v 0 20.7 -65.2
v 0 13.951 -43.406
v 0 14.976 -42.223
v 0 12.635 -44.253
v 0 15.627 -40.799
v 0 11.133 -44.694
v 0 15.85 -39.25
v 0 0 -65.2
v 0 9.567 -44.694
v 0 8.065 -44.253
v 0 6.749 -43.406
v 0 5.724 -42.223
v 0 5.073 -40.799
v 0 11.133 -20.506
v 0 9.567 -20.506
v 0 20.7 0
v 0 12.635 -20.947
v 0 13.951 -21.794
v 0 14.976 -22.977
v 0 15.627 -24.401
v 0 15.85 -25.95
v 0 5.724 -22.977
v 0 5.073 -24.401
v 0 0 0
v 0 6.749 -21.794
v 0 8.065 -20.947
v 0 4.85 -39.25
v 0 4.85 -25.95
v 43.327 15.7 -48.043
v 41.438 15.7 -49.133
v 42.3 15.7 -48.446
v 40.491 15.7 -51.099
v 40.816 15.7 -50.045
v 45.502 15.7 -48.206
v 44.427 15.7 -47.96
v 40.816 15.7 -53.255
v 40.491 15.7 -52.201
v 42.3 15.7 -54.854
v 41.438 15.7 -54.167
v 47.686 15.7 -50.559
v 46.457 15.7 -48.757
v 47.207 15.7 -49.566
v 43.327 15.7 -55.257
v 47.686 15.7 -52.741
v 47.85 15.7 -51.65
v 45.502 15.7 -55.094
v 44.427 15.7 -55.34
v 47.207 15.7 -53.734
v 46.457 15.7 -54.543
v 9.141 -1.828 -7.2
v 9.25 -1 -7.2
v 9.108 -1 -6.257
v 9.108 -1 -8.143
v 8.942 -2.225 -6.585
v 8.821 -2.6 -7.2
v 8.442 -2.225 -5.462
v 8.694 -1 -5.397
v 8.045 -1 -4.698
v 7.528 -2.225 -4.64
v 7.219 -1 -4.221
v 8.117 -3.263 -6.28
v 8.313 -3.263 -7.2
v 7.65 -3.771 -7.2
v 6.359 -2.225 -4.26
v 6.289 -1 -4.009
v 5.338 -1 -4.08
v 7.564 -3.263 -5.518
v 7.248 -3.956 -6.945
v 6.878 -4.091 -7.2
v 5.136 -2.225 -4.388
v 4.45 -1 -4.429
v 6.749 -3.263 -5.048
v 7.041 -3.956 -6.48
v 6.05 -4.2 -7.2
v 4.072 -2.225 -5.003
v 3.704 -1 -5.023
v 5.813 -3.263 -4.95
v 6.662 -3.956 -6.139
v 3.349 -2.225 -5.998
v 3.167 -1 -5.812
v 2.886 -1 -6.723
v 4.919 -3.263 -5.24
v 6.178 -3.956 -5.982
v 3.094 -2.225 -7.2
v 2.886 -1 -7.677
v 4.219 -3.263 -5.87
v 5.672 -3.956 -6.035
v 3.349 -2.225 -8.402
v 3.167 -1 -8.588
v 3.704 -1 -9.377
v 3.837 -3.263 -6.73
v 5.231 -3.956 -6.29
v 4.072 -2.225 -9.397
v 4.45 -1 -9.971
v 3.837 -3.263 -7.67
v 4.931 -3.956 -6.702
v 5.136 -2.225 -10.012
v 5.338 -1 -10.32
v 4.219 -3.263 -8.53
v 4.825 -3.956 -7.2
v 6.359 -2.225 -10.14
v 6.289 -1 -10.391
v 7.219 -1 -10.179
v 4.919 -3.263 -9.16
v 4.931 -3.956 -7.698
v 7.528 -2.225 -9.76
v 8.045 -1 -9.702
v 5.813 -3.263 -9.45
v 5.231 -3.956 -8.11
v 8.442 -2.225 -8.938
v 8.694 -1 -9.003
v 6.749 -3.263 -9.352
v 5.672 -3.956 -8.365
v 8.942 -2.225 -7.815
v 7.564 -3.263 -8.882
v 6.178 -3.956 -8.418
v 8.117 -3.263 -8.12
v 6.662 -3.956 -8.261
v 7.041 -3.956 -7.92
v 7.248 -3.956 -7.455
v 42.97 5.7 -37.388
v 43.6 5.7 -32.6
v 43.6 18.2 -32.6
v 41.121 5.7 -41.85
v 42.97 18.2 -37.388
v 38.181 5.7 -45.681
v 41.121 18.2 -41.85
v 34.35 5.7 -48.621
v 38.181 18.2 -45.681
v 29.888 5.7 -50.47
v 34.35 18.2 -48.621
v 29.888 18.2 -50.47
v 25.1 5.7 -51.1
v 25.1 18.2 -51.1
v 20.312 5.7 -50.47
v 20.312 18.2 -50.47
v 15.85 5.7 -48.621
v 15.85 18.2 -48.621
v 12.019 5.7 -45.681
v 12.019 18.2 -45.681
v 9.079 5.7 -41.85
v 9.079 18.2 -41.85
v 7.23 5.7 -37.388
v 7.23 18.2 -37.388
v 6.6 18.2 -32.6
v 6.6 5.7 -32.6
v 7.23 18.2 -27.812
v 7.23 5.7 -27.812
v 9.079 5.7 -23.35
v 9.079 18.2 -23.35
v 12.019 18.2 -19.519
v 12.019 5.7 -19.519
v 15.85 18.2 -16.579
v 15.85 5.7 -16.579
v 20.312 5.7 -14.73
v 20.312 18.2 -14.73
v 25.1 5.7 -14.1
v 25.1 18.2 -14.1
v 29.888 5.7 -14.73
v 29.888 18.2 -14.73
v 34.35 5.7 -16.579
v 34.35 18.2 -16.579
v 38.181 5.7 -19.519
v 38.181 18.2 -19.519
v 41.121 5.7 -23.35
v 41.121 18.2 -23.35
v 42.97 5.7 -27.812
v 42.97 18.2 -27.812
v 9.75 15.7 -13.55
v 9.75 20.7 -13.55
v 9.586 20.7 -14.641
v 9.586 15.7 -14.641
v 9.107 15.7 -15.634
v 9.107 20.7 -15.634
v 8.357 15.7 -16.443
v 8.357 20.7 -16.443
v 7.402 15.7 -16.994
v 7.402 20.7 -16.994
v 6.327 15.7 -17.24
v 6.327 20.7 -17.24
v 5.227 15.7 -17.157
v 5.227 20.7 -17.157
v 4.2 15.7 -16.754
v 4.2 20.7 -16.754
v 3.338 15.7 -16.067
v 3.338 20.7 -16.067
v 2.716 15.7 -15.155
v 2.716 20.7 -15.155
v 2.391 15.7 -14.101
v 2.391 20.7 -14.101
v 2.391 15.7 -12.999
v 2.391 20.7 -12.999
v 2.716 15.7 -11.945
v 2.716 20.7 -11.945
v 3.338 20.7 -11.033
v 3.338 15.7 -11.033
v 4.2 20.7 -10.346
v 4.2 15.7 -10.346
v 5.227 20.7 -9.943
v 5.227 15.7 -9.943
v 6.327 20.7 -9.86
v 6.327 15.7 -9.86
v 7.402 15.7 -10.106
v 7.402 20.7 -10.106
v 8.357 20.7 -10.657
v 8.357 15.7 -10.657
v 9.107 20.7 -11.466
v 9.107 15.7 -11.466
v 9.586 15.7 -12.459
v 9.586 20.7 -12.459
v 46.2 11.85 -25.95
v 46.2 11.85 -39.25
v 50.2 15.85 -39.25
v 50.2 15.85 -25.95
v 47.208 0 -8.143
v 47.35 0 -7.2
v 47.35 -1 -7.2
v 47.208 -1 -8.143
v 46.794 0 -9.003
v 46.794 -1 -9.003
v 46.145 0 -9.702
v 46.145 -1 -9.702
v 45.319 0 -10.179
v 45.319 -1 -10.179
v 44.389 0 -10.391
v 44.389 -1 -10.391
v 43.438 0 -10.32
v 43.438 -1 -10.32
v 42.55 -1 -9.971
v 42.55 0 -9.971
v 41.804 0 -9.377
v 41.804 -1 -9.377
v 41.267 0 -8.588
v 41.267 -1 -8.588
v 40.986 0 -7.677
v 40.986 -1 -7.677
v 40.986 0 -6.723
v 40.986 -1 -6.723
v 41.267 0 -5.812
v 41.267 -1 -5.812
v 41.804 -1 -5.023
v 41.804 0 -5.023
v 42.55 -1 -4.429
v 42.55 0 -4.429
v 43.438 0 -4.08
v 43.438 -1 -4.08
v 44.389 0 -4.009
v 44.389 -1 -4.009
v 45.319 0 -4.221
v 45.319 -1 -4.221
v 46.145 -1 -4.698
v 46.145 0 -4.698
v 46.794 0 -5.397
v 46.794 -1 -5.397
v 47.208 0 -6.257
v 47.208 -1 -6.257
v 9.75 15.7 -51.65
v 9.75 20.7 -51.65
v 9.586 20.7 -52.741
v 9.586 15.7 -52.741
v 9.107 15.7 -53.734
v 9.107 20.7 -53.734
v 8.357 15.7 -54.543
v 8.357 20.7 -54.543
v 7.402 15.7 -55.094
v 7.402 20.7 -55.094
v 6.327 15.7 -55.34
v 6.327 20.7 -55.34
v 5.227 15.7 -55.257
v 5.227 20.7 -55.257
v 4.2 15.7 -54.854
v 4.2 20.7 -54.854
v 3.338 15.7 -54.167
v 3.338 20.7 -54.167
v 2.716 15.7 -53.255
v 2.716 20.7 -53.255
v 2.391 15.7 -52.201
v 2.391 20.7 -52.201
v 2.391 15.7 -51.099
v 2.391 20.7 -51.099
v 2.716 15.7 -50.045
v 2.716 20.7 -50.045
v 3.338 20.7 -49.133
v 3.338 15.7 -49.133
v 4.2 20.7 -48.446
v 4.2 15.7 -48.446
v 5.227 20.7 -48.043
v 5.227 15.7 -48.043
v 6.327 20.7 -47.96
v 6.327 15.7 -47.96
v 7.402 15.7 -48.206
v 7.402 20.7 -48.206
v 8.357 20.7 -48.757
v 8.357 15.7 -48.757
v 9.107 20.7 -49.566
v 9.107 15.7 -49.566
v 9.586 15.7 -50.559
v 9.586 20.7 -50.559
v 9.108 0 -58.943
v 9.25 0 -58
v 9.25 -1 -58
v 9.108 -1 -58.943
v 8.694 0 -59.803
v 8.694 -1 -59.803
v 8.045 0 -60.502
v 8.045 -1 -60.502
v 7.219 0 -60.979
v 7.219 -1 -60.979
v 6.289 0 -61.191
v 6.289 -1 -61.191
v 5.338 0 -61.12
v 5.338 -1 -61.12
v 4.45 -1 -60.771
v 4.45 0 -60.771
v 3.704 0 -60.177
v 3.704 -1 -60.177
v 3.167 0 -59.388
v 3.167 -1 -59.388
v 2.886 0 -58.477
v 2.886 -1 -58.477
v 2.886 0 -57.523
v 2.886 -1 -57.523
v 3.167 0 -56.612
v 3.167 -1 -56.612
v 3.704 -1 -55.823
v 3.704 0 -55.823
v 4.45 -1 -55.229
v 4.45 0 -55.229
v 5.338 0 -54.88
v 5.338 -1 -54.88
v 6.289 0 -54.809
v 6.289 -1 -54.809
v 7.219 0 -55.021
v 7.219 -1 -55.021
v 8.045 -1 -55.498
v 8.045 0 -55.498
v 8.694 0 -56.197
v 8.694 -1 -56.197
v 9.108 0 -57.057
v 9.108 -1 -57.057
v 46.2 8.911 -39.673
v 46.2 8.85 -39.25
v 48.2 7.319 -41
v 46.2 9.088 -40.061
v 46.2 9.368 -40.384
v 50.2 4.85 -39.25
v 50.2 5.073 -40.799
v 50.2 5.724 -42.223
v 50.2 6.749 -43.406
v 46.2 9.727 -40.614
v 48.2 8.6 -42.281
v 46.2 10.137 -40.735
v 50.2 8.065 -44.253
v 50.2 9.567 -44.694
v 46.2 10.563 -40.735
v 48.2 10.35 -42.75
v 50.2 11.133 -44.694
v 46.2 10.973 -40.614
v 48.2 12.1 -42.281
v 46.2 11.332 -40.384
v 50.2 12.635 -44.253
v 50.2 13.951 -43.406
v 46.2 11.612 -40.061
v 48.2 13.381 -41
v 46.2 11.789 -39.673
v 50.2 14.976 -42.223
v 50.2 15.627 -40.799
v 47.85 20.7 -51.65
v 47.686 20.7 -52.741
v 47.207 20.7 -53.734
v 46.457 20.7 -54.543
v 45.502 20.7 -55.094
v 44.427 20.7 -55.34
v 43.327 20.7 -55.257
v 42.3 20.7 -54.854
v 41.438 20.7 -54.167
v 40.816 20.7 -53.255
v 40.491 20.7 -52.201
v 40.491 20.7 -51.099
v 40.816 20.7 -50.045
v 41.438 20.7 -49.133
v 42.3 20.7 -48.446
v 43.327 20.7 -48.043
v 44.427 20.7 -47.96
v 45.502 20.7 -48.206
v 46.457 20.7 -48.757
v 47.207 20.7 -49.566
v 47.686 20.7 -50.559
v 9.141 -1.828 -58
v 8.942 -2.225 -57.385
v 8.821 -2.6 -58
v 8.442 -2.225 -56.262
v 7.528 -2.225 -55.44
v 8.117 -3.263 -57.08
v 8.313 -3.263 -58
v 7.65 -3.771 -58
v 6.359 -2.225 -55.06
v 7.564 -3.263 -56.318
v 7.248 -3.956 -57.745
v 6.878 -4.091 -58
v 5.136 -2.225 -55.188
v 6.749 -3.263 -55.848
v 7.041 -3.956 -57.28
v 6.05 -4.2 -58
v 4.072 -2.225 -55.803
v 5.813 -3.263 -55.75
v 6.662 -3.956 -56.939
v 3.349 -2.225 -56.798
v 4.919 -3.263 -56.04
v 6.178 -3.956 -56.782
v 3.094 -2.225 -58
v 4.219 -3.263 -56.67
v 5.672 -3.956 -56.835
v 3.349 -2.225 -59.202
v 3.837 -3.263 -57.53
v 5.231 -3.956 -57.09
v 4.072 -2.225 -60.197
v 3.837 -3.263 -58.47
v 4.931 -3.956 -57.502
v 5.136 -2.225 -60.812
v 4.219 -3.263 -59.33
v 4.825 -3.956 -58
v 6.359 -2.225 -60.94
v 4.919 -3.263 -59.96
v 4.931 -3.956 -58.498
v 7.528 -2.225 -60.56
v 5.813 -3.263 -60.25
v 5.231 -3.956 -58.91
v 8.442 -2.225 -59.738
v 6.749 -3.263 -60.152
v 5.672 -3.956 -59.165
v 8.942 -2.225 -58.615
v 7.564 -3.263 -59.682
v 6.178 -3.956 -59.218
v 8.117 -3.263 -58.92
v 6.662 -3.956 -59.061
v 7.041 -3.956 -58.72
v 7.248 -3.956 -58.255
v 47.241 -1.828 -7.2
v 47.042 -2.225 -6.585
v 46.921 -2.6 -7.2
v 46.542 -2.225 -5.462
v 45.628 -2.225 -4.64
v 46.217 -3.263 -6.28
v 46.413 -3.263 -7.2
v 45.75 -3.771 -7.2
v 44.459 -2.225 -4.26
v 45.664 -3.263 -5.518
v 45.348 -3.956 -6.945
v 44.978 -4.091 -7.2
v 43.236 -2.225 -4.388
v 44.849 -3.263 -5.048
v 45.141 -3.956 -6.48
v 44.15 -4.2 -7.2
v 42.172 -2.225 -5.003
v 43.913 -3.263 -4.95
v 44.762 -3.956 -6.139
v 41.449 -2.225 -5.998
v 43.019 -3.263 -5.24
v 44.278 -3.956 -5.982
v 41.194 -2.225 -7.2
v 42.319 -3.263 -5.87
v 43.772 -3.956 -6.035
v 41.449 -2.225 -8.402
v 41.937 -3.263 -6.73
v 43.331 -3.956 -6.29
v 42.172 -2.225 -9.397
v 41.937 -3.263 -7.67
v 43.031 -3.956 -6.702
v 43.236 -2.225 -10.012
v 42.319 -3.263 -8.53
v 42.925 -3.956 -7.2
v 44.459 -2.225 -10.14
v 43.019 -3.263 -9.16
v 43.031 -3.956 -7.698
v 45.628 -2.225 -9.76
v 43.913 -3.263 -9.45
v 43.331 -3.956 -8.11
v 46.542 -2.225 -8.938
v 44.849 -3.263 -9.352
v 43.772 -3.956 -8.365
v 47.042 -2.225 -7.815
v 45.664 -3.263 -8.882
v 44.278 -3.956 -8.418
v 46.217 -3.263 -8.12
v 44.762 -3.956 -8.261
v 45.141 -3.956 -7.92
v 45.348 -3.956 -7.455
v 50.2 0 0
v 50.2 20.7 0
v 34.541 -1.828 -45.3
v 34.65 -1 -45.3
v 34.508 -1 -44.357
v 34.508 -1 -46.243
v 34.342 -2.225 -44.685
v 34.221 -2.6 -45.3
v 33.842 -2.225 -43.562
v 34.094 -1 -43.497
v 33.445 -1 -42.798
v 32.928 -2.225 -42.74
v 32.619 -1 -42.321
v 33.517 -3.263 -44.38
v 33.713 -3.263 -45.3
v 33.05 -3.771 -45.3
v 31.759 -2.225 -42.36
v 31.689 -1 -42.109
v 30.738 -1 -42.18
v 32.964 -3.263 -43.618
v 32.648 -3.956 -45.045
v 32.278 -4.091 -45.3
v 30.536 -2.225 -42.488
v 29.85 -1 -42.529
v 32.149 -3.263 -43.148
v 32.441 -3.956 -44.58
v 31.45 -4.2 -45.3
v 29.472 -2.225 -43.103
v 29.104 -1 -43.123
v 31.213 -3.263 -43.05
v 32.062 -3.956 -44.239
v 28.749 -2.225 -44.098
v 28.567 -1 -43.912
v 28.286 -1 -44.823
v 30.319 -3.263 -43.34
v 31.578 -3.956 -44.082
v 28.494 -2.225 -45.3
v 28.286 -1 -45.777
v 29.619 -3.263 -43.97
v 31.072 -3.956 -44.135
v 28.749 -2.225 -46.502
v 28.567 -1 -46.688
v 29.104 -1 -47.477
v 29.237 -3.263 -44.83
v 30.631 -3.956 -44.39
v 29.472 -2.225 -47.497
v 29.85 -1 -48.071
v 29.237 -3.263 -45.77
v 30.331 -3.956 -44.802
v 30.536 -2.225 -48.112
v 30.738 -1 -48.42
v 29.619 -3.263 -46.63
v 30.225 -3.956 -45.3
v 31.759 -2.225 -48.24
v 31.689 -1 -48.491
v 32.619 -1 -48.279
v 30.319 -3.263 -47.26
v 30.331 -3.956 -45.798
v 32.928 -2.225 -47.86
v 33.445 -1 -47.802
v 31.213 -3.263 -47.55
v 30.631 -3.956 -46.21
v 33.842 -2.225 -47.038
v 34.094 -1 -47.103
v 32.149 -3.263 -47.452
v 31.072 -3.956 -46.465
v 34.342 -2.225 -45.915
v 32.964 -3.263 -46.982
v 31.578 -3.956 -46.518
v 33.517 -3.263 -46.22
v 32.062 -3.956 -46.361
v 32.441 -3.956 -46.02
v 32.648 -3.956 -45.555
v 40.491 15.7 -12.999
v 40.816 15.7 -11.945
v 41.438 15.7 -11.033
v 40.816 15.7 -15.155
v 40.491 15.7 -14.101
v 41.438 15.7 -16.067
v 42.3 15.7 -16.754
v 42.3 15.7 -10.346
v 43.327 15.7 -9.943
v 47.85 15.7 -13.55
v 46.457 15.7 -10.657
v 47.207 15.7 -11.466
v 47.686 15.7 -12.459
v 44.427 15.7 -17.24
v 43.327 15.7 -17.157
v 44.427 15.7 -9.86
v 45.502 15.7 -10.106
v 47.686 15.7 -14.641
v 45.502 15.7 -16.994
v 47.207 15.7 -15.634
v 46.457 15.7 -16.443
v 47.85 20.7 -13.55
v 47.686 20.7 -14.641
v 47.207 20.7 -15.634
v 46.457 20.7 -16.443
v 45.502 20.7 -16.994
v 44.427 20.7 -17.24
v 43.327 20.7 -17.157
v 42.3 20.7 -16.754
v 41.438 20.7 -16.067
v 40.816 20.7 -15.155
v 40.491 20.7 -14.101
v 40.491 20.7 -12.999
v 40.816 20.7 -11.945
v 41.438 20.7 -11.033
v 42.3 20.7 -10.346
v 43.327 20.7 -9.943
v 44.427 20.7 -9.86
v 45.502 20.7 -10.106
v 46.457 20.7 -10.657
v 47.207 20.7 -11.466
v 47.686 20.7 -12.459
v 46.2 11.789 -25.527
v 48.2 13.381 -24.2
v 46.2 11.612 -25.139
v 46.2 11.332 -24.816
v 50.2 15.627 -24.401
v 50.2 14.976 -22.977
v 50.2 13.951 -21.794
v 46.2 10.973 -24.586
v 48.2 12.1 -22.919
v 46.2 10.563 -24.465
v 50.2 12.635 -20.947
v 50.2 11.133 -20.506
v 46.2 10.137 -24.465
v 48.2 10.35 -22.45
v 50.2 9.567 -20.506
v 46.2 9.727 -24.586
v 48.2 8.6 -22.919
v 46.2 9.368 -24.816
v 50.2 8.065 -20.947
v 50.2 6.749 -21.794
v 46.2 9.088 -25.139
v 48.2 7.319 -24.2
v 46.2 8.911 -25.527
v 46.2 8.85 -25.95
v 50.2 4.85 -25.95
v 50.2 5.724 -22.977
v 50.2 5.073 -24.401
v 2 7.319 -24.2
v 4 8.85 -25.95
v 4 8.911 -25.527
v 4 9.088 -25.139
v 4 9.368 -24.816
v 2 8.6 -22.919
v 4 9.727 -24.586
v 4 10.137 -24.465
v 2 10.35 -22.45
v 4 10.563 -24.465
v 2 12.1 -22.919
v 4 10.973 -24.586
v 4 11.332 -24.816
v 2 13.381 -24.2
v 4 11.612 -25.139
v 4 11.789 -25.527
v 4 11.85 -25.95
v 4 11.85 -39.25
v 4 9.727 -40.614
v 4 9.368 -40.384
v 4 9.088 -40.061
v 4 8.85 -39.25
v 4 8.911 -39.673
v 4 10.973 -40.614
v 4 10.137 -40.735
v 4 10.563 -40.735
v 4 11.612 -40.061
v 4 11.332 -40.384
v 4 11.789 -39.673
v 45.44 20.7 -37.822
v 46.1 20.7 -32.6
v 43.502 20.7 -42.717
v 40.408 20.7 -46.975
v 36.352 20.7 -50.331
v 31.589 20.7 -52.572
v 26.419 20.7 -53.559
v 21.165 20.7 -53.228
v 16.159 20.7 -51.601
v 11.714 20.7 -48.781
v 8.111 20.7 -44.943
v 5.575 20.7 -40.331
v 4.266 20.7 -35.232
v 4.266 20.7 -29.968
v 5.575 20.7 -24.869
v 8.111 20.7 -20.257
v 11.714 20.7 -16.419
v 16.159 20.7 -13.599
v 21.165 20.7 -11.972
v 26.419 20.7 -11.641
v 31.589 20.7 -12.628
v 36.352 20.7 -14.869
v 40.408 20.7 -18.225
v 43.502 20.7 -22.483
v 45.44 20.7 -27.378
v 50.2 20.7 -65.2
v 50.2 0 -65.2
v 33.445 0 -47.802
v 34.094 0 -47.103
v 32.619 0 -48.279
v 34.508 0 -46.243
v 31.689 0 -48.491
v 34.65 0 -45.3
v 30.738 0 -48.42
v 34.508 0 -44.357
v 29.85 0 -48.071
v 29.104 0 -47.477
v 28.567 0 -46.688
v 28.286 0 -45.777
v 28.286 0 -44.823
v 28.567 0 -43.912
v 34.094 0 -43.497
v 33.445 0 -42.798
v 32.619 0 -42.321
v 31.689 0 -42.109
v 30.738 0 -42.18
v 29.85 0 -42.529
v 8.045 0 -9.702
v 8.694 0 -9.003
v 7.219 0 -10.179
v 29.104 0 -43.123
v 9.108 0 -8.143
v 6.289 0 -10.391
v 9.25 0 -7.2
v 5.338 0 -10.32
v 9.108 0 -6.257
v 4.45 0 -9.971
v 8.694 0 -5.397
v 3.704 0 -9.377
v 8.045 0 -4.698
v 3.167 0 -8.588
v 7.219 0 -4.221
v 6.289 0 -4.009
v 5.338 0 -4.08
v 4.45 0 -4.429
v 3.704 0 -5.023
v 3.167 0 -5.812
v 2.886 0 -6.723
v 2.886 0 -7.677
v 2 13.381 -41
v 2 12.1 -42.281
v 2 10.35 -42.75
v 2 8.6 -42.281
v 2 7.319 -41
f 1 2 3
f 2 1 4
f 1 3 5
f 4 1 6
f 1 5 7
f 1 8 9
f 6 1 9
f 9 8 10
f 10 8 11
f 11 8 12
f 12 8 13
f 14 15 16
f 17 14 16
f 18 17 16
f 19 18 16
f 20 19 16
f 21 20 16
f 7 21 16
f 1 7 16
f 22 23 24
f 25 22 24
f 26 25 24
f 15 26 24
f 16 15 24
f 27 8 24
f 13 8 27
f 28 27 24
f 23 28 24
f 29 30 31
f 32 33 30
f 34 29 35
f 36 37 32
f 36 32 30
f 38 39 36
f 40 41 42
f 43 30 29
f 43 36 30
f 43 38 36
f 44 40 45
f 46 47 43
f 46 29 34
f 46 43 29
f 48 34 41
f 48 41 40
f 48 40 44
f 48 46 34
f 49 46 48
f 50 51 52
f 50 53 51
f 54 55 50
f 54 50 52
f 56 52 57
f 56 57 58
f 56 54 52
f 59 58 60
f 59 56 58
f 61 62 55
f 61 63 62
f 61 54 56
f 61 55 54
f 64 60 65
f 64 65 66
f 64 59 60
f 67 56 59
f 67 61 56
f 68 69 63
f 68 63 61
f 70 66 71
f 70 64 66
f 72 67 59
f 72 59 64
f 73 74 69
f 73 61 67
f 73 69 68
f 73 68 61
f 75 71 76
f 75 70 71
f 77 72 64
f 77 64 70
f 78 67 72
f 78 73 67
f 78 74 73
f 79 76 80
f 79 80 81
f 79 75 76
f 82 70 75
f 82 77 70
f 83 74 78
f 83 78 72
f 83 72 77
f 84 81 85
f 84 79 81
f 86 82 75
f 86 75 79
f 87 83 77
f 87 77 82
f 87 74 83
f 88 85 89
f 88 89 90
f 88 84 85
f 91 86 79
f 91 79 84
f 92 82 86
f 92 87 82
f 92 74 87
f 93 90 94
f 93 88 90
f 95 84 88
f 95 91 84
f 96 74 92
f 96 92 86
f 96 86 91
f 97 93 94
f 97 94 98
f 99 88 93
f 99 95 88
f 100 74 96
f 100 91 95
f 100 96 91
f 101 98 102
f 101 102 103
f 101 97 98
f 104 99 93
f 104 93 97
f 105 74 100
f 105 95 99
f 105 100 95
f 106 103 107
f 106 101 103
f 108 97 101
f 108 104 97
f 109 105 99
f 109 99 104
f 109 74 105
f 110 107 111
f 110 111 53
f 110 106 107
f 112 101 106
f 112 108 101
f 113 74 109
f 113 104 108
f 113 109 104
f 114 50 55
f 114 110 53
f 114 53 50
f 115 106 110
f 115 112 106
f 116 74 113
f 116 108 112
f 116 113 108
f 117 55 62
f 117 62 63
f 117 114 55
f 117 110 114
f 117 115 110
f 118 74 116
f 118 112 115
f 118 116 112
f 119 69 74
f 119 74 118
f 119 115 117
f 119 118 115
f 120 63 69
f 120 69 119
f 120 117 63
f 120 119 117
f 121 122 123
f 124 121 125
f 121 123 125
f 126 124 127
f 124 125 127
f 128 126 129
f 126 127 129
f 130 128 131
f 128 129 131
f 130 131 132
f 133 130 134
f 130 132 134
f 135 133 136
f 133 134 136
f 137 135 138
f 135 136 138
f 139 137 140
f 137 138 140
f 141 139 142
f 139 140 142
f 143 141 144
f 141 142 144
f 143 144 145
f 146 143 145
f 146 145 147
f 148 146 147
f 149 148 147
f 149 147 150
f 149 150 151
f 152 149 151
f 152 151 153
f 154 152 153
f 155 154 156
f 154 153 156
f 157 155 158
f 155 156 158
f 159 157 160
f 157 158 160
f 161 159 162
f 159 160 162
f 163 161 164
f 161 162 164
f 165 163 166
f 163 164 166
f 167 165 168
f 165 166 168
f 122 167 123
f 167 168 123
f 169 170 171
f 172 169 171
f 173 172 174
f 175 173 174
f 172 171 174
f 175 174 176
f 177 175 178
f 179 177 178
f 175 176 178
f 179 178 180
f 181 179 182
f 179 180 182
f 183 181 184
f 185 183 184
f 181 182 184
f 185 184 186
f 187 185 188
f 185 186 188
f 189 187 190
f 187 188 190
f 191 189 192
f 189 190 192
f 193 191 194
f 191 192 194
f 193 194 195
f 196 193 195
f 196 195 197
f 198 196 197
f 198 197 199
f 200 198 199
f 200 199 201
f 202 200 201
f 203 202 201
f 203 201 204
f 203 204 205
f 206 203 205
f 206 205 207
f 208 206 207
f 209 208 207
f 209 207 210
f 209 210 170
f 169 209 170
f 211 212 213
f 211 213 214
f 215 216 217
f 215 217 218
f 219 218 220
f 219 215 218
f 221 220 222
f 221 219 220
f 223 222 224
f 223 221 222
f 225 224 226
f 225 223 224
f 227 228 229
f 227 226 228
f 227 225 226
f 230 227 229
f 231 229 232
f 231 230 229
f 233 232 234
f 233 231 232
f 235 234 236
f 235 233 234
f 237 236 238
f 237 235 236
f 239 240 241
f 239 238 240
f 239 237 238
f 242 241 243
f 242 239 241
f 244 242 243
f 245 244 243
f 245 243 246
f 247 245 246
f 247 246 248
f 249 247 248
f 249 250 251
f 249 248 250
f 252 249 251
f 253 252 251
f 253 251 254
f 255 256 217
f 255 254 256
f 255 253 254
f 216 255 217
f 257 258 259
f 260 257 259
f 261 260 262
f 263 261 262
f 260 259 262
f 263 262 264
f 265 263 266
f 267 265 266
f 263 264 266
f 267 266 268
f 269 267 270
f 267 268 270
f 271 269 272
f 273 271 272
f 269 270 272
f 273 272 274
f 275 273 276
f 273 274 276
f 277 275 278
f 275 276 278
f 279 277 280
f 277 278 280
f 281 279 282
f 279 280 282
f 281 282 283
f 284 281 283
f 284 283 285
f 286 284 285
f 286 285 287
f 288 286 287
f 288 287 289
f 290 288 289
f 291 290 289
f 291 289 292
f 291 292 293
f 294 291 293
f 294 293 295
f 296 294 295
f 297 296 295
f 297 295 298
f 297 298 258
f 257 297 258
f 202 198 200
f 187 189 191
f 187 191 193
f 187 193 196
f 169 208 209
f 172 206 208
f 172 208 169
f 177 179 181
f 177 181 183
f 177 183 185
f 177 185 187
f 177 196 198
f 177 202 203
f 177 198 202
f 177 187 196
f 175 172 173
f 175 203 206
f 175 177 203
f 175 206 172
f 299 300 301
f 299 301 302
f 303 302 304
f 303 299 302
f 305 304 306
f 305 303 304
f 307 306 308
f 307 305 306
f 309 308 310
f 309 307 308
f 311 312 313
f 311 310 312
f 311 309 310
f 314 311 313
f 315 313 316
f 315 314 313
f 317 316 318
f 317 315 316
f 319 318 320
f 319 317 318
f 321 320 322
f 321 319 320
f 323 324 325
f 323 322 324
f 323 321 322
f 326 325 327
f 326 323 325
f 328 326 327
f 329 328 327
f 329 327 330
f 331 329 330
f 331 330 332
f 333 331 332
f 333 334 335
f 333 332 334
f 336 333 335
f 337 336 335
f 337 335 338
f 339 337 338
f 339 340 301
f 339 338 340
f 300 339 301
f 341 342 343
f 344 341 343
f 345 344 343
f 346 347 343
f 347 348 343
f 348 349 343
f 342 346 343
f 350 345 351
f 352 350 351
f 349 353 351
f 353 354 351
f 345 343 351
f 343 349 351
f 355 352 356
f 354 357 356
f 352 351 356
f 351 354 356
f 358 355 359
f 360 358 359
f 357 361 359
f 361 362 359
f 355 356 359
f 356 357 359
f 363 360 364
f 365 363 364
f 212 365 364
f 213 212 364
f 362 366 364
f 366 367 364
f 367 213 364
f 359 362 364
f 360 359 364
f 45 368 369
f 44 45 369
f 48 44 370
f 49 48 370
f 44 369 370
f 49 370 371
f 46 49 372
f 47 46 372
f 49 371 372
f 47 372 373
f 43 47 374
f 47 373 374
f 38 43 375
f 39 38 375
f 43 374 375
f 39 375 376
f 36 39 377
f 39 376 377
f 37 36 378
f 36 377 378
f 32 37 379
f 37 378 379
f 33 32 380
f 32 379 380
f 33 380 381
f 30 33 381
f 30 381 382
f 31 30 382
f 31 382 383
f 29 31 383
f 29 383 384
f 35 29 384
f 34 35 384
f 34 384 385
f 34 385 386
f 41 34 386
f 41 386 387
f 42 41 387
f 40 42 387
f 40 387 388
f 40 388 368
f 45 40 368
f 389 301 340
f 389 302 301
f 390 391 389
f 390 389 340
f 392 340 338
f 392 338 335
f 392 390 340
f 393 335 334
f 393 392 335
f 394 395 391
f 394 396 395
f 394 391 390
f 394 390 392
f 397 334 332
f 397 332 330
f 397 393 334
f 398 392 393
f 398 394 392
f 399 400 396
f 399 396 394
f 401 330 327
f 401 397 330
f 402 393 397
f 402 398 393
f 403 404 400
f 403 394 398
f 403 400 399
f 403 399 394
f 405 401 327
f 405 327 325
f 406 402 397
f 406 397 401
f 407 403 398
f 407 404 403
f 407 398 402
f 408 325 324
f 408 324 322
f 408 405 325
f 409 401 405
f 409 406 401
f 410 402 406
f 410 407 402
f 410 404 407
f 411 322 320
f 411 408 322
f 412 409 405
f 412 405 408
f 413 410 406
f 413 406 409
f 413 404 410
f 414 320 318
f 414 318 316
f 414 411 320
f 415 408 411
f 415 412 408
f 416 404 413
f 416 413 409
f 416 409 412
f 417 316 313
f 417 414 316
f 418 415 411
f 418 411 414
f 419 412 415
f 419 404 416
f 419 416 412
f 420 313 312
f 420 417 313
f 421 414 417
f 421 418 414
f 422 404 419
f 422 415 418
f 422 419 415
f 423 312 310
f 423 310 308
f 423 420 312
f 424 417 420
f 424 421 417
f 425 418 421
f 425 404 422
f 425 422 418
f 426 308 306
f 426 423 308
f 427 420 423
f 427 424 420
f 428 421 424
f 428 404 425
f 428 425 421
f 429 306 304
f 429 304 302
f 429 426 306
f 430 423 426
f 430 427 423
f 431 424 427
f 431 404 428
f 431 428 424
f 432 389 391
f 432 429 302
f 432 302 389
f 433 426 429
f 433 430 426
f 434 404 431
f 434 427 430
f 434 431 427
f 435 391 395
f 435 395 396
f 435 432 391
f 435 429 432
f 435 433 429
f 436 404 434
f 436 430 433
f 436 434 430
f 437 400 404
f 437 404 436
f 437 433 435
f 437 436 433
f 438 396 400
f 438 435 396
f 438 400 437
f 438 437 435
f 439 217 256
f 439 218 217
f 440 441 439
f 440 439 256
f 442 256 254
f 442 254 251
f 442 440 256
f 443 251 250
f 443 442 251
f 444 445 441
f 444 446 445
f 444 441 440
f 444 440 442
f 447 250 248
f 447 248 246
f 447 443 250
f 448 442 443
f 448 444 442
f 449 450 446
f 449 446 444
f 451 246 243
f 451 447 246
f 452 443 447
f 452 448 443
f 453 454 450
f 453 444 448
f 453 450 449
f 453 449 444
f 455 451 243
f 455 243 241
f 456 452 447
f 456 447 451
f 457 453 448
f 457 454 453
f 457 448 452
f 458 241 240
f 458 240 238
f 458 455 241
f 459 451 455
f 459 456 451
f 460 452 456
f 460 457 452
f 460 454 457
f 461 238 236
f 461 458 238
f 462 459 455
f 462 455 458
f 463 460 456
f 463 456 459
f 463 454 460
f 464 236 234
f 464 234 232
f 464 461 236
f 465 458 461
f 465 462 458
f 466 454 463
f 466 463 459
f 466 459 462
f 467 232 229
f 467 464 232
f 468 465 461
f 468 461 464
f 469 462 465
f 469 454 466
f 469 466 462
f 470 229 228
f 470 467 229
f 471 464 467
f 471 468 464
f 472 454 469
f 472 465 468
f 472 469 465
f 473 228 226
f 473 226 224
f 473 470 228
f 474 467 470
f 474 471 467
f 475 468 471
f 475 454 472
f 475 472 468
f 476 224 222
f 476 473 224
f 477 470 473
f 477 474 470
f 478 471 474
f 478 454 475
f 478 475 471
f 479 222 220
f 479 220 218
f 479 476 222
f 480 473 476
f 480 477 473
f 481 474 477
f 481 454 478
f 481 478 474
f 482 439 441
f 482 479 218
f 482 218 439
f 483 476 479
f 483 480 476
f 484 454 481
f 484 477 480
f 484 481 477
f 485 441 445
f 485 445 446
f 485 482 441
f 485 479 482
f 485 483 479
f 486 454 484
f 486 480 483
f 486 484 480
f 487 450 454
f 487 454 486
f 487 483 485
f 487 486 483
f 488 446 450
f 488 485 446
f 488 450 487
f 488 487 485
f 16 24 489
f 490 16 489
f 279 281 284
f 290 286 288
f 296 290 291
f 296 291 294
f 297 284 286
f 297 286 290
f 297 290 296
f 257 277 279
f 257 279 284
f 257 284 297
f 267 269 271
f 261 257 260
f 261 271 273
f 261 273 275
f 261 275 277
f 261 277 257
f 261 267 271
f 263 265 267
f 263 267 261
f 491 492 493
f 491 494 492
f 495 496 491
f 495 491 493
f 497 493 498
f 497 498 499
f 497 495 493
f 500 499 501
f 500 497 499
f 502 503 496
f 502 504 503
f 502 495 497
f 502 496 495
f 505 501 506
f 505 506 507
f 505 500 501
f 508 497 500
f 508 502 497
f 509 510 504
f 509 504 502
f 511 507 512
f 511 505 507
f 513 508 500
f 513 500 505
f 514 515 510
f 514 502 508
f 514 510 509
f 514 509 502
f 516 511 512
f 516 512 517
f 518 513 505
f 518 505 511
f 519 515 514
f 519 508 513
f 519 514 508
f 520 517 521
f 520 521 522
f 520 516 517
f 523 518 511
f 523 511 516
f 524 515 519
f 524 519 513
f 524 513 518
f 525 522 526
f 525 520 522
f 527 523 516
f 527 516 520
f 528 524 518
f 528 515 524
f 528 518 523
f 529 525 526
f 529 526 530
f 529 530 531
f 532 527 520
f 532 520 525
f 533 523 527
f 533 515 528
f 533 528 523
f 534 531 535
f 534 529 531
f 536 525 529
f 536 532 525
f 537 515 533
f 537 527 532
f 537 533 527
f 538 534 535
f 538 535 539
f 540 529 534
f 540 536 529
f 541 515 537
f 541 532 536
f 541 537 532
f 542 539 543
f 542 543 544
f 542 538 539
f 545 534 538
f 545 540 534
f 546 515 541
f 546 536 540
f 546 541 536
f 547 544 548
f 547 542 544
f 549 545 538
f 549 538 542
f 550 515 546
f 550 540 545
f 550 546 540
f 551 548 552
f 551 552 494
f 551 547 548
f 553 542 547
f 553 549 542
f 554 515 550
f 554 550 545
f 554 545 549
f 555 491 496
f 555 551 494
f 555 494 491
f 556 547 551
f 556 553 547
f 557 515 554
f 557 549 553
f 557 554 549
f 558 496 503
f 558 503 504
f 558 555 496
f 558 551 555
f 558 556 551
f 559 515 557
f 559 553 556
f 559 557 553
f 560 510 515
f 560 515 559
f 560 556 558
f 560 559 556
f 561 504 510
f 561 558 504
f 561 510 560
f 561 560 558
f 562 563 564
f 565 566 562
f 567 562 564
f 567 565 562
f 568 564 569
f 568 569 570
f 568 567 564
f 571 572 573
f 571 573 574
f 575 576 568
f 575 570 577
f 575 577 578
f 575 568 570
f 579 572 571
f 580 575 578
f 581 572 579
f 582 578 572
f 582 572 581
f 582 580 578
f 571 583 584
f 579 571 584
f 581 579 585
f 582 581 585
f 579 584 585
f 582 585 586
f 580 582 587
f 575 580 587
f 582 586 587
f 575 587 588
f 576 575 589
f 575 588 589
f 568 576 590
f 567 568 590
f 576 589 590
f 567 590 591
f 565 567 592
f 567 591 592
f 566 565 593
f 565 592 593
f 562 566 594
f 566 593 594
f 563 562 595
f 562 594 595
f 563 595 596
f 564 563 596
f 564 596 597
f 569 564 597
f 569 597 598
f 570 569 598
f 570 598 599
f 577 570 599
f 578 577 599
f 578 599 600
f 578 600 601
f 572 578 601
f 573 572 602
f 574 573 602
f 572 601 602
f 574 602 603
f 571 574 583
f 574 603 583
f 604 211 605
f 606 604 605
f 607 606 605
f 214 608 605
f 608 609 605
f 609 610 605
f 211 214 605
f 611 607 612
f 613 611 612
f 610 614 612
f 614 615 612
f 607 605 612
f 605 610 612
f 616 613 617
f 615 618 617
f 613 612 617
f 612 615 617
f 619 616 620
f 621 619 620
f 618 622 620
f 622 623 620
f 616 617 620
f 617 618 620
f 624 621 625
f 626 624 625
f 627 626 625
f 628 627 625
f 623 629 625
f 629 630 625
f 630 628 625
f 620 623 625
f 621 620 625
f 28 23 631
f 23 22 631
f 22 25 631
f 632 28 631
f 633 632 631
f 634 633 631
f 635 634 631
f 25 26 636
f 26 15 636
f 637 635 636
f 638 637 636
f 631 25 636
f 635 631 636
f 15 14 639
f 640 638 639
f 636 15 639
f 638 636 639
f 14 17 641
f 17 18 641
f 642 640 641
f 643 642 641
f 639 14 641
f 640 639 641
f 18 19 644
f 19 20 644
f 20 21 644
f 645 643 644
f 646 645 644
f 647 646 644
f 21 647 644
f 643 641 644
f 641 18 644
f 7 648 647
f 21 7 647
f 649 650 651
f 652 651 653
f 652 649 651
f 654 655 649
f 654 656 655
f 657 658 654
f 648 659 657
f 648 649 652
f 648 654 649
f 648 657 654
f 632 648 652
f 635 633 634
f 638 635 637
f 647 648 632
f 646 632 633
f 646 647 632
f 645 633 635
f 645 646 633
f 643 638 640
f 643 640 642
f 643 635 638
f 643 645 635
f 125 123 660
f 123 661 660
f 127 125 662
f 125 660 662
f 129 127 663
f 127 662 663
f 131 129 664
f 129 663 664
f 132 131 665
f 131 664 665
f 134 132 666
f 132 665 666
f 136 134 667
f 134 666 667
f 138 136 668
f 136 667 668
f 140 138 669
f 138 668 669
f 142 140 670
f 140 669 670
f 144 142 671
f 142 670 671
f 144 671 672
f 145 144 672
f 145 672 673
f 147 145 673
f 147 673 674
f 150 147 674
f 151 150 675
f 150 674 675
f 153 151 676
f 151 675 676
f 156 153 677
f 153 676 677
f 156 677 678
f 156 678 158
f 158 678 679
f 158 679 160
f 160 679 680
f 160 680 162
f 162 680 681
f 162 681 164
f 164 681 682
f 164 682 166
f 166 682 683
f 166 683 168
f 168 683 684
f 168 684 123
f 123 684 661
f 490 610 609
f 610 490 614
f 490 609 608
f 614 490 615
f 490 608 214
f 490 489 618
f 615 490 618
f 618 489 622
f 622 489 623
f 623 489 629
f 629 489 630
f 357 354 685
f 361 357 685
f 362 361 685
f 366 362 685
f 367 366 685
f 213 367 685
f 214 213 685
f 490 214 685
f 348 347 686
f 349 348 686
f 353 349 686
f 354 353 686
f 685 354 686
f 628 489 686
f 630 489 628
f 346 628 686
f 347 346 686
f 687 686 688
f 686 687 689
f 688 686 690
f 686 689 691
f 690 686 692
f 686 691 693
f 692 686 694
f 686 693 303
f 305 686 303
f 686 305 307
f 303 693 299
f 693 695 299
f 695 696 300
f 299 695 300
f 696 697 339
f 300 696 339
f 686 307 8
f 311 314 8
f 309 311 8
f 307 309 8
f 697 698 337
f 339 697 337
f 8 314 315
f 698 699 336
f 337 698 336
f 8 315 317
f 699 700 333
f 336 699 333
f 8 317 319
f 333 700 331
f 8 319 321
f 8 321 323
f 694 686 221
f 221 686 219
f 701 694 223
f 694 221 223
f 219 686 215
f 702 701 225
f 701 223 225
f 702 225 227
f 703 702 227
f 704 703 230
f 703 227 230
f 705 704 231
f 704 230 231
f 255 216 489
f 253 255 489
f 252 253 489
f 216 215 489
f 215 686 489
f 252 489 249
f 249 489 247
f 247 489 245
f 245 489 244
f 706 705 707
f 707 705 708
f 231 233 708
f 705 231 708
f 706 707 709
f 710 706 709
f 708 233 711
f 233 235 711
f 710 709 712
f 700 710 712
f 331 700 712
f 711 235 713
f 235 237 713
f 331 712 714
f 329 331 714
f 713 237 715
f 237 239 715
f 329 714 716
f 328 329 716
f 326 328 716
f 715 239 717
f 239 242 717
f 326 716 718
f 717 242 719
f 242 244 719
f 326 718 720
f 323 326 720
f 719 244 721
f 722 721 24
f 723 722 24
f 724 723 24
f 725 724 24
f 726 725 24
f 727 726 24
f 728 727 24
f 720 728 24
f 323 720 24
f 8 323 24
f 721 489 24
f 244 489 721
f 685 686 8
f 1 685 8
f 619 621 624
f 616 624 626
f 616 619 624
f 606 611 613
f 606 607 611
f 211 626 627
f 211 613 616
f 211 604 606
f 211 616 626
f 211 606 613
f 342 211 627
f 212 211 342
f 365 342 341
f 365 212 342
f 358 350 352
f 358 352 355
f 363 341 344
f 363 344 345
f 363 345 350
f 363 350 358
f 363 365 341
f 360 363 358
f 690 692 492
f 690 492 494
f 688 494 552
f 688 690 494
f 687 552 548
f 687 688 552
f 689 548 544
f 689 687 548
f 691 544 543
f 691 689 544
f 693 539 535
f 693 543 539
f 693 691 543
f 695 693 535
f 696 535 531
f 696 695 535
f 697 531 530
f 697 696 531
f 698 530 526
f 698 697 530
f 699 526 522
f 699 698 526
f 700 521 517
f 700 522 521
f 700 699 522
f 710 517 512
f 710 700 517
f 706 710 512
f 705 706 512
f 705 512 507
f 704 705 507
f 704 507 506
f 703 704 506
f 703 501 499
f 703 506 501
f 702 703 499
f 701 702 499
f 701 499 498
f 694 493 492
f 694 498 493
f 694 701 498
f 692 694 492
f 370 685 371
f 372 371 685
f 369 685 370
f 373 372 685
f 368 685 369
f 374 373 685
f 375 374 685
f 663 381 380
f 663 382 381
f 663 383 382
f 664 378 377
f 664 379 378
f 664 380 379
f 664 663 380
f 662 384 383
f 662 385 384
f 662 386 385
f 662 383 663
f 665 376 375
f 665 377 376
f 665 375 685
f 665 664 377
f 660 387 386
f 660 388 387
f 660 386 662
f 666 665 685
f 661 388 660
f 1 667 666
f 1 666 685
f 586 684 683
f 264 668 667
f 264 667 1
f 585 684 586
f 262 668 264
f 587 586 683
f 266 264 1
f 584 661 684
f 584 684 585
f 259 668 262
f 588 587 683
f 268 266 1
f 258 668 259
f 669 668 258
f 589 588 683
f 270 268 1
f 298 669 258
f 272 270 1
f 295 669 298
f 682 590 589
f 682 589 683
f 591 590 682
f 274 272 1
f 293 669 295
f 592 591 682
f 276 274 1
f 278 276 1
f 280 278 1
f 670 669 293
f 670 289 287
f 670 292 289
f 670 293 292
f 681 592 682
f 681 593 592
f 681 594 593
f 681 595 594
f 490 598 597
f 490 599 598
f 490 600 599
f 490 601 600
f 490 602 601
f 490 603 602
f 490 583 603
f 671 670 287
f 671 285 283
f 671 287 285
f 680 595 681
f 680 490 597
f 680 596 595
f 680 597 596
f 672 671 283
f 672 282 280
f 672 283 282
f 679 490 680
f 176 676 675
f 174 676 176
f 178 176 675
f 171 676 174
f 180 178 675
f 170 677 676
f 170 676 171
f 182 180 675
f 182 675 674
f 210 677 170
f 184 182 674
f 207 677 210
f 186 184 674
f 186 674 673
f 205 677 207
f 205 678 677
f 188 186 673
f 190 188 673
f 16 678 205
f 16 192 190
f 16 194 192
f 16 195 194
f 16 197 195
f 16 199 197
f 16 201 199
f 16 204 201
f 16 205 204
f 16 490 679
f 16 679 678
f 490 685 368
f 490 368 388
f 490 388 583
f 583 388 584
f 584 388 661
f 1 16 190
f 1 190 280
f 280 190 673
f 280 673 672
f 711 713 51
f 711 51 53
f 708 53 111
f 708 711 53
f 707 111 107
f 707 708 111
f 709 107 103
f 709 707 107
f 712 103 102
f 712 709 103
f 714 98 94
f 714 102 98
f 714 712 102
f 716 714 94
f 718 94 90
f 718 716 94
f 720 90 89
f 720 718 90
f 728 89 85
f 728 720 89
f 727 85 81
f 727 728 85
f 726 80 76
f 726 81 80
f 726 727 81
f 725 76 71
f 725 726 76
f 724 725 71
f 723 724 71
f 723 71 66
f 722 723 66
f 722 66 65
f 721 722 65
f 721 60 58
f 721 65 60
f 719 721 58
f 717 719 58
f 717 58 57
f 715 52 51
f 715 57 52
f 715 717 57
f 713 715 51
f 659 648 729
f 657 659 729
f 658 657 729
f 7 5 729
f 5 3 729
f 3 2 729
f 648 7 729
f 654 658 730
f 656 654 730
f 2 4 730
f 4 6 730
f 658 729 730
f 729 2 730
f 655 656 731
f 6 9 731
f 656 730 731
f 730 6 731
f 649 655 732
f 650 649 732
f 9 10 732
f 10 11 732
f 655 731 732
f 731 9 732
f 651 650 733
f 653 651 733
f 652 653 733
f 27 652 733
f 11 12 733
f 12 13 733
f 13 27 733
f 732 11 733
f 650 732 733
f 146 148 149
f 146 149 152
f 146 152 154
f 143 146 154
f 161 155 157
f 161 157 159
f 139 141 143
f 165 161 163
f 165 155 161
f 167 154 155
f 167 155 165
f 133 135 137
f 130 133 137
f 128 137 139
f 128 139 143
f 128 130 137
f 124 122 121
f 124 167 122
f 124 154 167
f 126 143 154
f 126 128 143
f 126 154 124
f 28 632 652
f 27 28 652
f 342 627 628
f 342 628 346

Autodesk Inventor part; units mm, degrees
ref_plane "YZ Plane" through (0, 0, 0) normal (1, 0, 0) x (0, 1, 0)
ref_plane "XZ Plane" through (0, 0, 0) normal (0, 1, 0) x (-1, 0, 0)
sketch "Boceto1" plane through (0, 0, 0) normal (0, 1, 0) x (-1, 0, 0)
  line L0 (0, 0) -> (-50.2, 0)
  line L1 (-50.2, 0) -> (-50.2, -65.2)
  line L2 (-50.2, -65.2) -> (0, -65.2)
  line L3 (0, -65.2) -> (0, 0)
  dimension "d0" = 50.2
  dimension "d1" = 65.2
extrude "Extrusión1" add sketch "Boceto1" along normal blind 20.7
sketch "Boceto2" plane through (0, 20.7, 0) normal (0, 1, 0) x (1, 0, 0)
  line L0 (-14.4985, 32.6) -> (58.2485, 32.6)
  circle A0 centre (25.1, 32.6) radius 18.5
  line L1 (0, 65.2) -> (0, 0) projected
  dimension "d7" = 37
  dimension "d57" = 0
  dimension "d58" = 25.1
extrude "Extrusión2" cut sketch "Boceto2" against normal blind 15
sketch "Boceto3" plane through (50.2, 0, 0) normal (1, 0, 0) x (0, 0, -1)
  line L0 (32.6, 28.8672) -> (32.6, -9.3744)
  line L1 (-5.2256, 10.35) -> (70.0589, 10.35)
  line L2 (25.95, 10.35) -> (39.25, 10.35) construction
  line L3 (25.95, 8.85) -> (39.25, 8.85)
  line L4 (39.25, 11.85) -> (25.95, 11.85)
  arc A0 (25.95, 11.85) -> (25.95, 8.85) centre (25.95, 10.35) ccw
  arc A1 (39.25, 8.85) -> (39.25, 11.85) centre (39.25, 10.35) ccw
  point P0 (0, 0)
  point P1 (32.6, 10.35)
  point P2 (40.75, 10.35)
  point P3 (24.45, 10.35)
  dimension "d11" = 16.3
  dimension "d12" = 3
  dimension "d13" = 0
extrude "Extrusión3" cut sketch "Boceto3" against normal blind 4
chamfer "Chaflán1" distance 4 angle 45 4 edges at (50.2, 8.85, -32.6) (50.2, 10.35, -24.45) (50.2, 11.85, -32.6) (50.2, 10.35, -40.75)
sketch "Boceto4" plane through (50.2, 0, 0) normal (1, 0, 0) x (0, 0, -1)
  point P0 (0, 0)
ref_plane "Plano de trabajo1" through (25.1, 0, 0) normal (1, 0, 0) x (0, 0, -1)
mirror "Simetría1" about plane through (25.1, 0, 0) normal (1, 0, 0) of "Extrusión3"
chamfer "Chaflán2" distance 4 angle 45 4 edges at (0, 11.85, -32.6) (0, 10.35, -24.45) (0, 8.85, -32.6) (0, 10.35, -40.75)
chamfer "Chaflán3" distance 2.5 angle 45 1 edges at (6.6, 20.7, -32.6)
sketch "Boceto5" plane through (0, 0, 0) normal (0, -1, 0) x (1, 0, 0)
  line L0 (25.1, 22.2035) -> (25.1, -86.3829)
  line L1 (-10.0483, -32.6) -> (59.9656, -32.6)
  circle A0 centre (6.05, -7.2) radius 3.2
  circle A1 centre (44.15, -7.2) radius 3.2
  circle A2 centre (6.05, -58) radius 3.2
  circle A3 centre (31.45, -45.3) radius 3.2
  point P0 (0, 0)
  dimension "d35" = 38.1
  dimension "d36" = 38.1
  dimension "d37" = 0
  dimension "d38" = 50.8
  dimension "d39" = 50.8
  dimension "d40" = 12.7
  dimension "d41" = 12.7
  dimension "d42" = 6.4
extrude "Extrusión4" add sketch "Boceto5" along normal blind 4.2
fillet "Empalme1" radius 3.2 4 edges at (2.85, -4.2, -58) (28.25, -4.2, -45.3) (40.95, -4.2, -7.2) (2.85, -4.2, -7.2)
sketch "Boceto6" plane through (0, 20.7, 0) normal (0, 1, 0) x (1, 0, 0)
  line L0 (-6.6573, 32.6) -> (60.5927, 32.6)
  line L1 (25.1, -18.2708) -> (25.1, 82.1469)
  circle A0 centre (6.05, 13.55) radius 3.7
  circle A1 centre (6.05, 51.65) radius 3.7
  circle A2 centre (44.15, 13.55) radius 3.7
  circle A3 centre (44.15, 51.65) radius 3.7
  point P0 (0, 0)
  dimension "d51" = 38.1
  dimension "d52" = 38.1
  dimension "d53" = 38.1
  dimension "d54" = 38.1
  dimension "d55" = 38.1
  dimension "d56" = 7.4
extrude "Extrusión5" cut sketch "Boceto6" against normal blind 5
properties material "Plastico PETG"
